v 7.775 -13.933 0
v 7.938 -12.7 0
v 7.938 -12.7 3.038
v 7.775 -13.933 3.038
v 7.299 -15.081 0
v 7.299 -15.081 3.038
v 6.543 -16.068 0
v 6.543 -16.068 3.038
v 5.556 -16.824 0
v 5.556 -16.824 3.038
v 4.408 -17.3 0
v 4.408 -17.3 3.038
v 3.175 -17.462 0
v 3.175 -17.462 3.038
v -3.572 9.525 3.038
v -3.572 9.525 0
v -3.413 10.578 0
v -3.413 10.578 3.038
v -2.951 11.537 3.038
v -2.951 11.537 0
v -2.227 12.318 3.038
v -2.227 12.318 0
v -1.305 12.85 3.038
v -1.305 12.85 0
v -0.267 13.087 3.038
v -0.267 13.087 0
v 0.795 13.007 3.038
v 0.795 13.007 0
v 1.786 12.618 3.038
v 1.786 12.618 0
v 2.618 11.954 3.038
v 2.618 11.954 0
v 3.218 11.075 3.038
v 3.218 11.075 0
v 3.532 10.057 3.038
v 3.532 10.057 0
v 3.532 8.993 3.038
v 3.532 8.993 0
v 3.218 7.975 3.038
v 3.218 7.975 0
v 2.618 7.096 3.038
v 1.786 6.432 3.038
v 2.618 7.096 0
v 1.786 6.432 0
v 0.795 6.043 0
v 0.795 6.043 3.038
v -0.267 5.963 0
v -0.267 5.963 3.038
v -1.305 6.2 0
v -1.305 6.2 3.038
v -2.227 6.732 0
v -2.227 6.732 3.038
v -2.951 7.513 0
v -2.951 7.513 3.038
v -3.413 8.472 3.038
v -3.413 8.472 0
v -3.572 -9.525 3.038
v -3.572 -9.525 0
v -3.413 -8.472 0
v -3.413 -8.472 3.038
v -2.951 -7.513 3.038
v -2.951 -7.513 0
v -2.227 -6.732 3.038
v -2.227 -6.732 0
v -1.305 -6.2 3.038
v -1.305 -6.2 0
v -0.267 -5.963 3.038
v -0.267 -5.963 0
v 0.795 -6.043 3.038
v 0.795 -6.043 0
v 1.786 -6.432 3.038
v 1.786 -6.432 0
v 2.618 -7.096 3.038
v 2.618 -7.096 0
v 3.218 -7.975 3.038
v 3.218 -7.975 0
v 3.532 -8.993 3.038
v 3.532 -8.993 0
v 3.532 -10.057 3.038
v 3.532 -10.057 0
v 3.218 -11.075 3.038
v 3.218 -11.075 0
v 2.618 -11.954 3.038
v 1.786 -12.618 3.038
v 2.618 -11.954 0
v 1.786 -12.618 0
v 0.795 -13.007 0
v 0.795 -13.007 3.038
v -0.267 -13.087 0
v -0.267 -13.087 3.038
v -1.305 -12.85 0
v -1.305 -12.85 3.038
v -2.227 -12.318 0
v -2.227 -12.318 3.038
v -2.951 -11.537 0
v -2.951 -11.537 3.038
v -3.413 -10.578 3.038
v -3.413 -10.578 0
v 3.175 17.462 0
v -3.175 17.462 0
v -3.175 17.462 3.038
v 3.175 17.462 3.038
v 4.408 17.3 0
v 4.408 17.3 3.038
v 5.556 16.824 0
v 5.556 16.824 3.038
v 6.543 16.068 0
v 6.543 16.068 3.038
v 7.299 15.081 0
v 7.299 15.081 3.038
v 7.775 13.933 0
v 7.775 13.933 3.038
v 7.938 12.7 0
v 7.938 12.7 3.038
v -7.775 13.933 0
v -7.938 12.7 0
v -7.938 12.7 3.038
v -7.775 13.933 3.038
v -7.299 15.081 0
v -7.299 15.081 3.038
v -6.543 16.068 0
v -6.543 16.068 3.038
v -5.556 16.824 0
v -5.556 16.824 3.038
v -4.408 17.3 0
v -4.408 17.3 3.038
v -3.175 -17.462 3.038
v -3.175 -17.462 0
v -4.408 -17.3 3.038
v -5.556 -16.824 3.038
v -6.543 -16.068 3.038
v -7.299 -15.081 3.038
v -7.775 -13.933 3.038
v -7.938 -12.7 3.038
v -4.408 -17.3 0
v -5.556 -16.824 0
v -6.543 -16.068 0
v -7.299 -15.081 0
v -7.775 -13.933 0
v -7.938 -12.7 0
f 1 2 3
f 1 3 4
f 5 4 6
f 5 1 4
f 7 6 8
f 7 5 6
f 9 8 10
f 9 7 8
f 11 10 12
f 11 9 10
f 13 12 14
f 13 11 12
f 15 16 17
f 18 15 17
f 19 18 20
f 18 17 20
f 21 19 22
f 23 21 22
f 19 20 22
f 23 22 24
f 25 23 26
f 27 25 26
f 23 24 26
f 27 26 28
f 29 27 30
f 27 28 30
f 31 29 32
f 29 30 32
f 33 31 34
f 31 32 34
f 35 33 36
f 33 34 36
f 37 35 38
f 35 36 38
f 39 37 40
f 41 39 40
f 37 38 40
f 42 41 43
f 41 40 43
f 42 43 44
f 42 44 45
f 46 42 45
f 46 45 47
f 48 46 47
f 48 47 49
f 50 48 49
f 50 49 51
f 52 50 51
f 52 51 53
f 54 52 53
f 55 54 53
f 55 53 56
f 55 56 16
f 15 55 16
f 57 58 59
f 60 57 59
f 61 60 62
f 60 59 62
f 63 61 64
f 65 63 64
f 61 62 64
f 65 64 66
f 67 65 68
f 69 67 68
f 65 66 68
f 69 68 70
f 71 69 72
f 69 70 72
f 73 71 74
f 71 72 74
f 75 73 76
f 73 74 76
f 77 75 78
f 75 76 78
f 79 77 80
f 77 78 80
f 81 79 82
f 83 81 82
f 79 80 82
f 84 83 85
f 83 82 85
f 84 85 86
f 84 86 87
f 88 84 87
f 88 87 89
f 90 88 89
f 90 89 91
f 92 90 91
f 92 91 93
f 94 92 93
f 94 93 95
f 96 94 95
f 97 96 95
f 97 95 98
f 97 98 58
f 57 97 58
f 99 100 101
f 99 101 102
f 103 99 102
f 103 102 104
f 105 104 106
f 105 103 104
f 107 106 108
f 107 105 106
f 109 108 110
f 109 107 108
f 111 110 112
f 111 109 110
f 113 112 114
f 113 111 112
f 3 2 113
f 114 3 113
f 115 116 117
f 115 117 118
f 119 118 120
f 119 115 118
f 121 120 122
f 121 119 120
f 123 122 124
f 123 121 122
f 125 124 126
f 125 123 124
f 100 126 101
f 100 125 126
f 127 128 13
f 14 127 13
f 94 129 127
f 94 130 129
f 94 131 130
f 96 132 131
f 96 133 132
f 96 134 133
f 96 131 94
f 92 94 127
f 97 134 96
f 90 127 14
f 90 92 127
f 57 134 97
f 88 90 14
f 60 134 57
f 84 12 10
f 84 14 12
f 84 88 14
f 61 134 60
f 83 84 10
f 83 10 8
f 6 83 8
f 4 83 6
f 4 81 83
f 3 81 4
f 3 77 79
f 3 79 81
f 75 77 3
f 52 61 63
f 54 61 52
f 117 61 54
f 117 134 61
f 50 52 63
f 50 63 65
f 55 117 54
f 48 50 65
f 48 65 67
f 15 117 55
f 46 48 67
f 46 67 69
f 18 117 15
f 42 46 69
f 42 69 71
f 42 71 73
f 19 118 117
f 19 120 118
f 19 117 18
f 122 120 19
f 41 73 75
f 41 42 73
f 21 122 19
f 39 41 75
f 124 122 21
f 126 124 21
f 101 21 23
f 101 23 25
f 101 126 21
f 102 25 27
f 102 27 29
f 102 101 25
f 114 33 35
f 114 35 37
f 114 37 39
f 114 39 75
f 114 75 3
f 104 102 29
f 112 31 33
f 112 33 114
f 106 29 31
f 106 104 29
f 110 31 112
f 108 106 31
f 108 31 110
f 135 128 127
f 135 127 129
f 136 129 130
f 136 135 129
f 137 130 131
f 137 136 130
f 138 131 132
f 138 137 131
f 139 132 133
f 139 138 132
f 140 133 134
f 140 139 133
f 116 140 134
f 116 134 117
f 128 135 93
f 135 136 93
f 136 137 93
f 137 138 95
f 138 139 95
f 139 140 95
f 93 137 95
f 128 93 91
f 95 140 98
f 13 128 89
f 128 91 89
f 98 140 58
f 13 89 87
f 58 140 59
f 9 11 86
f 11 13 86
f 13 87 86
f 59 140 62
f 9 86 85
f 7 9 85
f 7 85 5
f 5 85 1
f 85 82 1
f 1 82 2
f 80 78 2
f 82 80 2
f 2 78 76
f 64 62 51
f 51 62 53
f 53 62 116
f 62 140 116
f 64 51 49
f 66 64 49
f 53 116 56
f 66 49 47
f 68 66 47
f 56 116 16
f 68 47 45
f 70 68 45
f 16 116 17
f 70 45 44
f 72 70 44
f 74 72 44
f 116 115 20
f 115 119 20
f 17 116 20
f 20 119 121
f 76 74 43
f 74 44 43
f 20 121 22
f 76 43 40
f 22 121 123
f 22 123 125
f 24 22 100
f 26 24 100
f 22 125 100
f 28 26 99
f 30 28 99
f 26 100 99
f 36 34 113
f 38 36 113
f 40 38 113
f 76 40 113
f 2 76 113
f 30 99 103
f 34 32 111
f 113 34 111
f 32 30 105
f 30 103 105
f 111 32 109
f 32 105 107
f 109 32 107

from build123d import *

# Parameters (mm, degrees)
SKETCH1_W                       = 15.875
SKETCH1_H                       = 34.925
BASE_FLANGE1_DEPTH              = 3.03784
F_9_32_0_28125_DIAMETER_HOLE1_D = 7.14375
BREAK_CORNER1_DEPTH             = 3.03784


# Read off the part's stored shape, not the designer's step: Break-Corner1
# Sheet-metal steps are written as plain solids
with BuildPart() as part:
    # Sketch1 → Base-Flange1 (new body)
    with BuildSketch(Plane.XY):
        Rectangle(SKETCH1_W, SKETCH1_H)
    extrude(amount=BASE_FLANGE1_DEPTH)

    # 9/32 (0.28125) Diameter Hole1 (through all)
    with Locations(Plane.XY.offset(3.03784)):
        with Locations((0, 9.525), (0, -9.525)):
            Hole(F_9_32_0_28125_DIAMETER_HOLE1_D / 2)

    # Break-Corner1 outline → Break-Corner1 (cut)
    with BuildSketch(Plane.XY):
        with BuildLine():
            Line((-7.9375, -17.4625), (-3.175, -17.4625))
            ThreePointArc((-3.175, -17.4625), (-6.542596045, -16.067596045), (-7.9375, -12.7))
            Line((-7.9375, -12.7), (-7.9375, -17.4625))
        make_face()
        with BuildLine():
            ThreePointArc((7.9375, -12.7), (6.542596045, -16.067596045), (3.175, -17.4625))
            Line((3.175, -17.4625), (7.9375, -17.4625))
            Line((7.9375, -17.4625), (7.9375, -12.7))
        make_face()
        with BuildLine():
            Line((-7.9375, 17.4625), (-7.9375, 12.7))
            ThreePointArc((-7.9375, 12.7), (-6.542596045, 16.067596045), (-3.175, 17.4625))
            Line((-3.175, 17.4625), (-7.9375, 17.4625))
        make_face()
        with BuildLine():
            ThreePointArc((3.175, 17.4625), (6.542596045, 16.067596045), (7.9375, 12.7))
            Line((7.9375, 12.7), (7.9375, 17.4625))
            Line((7.9375, 17.4625), (3.175, 17.4625))
        make_face()
    extrude(amount=BREAK_CORNER1_DEPTH, mode=Mode.SUBTRACT)


solid = part.part
